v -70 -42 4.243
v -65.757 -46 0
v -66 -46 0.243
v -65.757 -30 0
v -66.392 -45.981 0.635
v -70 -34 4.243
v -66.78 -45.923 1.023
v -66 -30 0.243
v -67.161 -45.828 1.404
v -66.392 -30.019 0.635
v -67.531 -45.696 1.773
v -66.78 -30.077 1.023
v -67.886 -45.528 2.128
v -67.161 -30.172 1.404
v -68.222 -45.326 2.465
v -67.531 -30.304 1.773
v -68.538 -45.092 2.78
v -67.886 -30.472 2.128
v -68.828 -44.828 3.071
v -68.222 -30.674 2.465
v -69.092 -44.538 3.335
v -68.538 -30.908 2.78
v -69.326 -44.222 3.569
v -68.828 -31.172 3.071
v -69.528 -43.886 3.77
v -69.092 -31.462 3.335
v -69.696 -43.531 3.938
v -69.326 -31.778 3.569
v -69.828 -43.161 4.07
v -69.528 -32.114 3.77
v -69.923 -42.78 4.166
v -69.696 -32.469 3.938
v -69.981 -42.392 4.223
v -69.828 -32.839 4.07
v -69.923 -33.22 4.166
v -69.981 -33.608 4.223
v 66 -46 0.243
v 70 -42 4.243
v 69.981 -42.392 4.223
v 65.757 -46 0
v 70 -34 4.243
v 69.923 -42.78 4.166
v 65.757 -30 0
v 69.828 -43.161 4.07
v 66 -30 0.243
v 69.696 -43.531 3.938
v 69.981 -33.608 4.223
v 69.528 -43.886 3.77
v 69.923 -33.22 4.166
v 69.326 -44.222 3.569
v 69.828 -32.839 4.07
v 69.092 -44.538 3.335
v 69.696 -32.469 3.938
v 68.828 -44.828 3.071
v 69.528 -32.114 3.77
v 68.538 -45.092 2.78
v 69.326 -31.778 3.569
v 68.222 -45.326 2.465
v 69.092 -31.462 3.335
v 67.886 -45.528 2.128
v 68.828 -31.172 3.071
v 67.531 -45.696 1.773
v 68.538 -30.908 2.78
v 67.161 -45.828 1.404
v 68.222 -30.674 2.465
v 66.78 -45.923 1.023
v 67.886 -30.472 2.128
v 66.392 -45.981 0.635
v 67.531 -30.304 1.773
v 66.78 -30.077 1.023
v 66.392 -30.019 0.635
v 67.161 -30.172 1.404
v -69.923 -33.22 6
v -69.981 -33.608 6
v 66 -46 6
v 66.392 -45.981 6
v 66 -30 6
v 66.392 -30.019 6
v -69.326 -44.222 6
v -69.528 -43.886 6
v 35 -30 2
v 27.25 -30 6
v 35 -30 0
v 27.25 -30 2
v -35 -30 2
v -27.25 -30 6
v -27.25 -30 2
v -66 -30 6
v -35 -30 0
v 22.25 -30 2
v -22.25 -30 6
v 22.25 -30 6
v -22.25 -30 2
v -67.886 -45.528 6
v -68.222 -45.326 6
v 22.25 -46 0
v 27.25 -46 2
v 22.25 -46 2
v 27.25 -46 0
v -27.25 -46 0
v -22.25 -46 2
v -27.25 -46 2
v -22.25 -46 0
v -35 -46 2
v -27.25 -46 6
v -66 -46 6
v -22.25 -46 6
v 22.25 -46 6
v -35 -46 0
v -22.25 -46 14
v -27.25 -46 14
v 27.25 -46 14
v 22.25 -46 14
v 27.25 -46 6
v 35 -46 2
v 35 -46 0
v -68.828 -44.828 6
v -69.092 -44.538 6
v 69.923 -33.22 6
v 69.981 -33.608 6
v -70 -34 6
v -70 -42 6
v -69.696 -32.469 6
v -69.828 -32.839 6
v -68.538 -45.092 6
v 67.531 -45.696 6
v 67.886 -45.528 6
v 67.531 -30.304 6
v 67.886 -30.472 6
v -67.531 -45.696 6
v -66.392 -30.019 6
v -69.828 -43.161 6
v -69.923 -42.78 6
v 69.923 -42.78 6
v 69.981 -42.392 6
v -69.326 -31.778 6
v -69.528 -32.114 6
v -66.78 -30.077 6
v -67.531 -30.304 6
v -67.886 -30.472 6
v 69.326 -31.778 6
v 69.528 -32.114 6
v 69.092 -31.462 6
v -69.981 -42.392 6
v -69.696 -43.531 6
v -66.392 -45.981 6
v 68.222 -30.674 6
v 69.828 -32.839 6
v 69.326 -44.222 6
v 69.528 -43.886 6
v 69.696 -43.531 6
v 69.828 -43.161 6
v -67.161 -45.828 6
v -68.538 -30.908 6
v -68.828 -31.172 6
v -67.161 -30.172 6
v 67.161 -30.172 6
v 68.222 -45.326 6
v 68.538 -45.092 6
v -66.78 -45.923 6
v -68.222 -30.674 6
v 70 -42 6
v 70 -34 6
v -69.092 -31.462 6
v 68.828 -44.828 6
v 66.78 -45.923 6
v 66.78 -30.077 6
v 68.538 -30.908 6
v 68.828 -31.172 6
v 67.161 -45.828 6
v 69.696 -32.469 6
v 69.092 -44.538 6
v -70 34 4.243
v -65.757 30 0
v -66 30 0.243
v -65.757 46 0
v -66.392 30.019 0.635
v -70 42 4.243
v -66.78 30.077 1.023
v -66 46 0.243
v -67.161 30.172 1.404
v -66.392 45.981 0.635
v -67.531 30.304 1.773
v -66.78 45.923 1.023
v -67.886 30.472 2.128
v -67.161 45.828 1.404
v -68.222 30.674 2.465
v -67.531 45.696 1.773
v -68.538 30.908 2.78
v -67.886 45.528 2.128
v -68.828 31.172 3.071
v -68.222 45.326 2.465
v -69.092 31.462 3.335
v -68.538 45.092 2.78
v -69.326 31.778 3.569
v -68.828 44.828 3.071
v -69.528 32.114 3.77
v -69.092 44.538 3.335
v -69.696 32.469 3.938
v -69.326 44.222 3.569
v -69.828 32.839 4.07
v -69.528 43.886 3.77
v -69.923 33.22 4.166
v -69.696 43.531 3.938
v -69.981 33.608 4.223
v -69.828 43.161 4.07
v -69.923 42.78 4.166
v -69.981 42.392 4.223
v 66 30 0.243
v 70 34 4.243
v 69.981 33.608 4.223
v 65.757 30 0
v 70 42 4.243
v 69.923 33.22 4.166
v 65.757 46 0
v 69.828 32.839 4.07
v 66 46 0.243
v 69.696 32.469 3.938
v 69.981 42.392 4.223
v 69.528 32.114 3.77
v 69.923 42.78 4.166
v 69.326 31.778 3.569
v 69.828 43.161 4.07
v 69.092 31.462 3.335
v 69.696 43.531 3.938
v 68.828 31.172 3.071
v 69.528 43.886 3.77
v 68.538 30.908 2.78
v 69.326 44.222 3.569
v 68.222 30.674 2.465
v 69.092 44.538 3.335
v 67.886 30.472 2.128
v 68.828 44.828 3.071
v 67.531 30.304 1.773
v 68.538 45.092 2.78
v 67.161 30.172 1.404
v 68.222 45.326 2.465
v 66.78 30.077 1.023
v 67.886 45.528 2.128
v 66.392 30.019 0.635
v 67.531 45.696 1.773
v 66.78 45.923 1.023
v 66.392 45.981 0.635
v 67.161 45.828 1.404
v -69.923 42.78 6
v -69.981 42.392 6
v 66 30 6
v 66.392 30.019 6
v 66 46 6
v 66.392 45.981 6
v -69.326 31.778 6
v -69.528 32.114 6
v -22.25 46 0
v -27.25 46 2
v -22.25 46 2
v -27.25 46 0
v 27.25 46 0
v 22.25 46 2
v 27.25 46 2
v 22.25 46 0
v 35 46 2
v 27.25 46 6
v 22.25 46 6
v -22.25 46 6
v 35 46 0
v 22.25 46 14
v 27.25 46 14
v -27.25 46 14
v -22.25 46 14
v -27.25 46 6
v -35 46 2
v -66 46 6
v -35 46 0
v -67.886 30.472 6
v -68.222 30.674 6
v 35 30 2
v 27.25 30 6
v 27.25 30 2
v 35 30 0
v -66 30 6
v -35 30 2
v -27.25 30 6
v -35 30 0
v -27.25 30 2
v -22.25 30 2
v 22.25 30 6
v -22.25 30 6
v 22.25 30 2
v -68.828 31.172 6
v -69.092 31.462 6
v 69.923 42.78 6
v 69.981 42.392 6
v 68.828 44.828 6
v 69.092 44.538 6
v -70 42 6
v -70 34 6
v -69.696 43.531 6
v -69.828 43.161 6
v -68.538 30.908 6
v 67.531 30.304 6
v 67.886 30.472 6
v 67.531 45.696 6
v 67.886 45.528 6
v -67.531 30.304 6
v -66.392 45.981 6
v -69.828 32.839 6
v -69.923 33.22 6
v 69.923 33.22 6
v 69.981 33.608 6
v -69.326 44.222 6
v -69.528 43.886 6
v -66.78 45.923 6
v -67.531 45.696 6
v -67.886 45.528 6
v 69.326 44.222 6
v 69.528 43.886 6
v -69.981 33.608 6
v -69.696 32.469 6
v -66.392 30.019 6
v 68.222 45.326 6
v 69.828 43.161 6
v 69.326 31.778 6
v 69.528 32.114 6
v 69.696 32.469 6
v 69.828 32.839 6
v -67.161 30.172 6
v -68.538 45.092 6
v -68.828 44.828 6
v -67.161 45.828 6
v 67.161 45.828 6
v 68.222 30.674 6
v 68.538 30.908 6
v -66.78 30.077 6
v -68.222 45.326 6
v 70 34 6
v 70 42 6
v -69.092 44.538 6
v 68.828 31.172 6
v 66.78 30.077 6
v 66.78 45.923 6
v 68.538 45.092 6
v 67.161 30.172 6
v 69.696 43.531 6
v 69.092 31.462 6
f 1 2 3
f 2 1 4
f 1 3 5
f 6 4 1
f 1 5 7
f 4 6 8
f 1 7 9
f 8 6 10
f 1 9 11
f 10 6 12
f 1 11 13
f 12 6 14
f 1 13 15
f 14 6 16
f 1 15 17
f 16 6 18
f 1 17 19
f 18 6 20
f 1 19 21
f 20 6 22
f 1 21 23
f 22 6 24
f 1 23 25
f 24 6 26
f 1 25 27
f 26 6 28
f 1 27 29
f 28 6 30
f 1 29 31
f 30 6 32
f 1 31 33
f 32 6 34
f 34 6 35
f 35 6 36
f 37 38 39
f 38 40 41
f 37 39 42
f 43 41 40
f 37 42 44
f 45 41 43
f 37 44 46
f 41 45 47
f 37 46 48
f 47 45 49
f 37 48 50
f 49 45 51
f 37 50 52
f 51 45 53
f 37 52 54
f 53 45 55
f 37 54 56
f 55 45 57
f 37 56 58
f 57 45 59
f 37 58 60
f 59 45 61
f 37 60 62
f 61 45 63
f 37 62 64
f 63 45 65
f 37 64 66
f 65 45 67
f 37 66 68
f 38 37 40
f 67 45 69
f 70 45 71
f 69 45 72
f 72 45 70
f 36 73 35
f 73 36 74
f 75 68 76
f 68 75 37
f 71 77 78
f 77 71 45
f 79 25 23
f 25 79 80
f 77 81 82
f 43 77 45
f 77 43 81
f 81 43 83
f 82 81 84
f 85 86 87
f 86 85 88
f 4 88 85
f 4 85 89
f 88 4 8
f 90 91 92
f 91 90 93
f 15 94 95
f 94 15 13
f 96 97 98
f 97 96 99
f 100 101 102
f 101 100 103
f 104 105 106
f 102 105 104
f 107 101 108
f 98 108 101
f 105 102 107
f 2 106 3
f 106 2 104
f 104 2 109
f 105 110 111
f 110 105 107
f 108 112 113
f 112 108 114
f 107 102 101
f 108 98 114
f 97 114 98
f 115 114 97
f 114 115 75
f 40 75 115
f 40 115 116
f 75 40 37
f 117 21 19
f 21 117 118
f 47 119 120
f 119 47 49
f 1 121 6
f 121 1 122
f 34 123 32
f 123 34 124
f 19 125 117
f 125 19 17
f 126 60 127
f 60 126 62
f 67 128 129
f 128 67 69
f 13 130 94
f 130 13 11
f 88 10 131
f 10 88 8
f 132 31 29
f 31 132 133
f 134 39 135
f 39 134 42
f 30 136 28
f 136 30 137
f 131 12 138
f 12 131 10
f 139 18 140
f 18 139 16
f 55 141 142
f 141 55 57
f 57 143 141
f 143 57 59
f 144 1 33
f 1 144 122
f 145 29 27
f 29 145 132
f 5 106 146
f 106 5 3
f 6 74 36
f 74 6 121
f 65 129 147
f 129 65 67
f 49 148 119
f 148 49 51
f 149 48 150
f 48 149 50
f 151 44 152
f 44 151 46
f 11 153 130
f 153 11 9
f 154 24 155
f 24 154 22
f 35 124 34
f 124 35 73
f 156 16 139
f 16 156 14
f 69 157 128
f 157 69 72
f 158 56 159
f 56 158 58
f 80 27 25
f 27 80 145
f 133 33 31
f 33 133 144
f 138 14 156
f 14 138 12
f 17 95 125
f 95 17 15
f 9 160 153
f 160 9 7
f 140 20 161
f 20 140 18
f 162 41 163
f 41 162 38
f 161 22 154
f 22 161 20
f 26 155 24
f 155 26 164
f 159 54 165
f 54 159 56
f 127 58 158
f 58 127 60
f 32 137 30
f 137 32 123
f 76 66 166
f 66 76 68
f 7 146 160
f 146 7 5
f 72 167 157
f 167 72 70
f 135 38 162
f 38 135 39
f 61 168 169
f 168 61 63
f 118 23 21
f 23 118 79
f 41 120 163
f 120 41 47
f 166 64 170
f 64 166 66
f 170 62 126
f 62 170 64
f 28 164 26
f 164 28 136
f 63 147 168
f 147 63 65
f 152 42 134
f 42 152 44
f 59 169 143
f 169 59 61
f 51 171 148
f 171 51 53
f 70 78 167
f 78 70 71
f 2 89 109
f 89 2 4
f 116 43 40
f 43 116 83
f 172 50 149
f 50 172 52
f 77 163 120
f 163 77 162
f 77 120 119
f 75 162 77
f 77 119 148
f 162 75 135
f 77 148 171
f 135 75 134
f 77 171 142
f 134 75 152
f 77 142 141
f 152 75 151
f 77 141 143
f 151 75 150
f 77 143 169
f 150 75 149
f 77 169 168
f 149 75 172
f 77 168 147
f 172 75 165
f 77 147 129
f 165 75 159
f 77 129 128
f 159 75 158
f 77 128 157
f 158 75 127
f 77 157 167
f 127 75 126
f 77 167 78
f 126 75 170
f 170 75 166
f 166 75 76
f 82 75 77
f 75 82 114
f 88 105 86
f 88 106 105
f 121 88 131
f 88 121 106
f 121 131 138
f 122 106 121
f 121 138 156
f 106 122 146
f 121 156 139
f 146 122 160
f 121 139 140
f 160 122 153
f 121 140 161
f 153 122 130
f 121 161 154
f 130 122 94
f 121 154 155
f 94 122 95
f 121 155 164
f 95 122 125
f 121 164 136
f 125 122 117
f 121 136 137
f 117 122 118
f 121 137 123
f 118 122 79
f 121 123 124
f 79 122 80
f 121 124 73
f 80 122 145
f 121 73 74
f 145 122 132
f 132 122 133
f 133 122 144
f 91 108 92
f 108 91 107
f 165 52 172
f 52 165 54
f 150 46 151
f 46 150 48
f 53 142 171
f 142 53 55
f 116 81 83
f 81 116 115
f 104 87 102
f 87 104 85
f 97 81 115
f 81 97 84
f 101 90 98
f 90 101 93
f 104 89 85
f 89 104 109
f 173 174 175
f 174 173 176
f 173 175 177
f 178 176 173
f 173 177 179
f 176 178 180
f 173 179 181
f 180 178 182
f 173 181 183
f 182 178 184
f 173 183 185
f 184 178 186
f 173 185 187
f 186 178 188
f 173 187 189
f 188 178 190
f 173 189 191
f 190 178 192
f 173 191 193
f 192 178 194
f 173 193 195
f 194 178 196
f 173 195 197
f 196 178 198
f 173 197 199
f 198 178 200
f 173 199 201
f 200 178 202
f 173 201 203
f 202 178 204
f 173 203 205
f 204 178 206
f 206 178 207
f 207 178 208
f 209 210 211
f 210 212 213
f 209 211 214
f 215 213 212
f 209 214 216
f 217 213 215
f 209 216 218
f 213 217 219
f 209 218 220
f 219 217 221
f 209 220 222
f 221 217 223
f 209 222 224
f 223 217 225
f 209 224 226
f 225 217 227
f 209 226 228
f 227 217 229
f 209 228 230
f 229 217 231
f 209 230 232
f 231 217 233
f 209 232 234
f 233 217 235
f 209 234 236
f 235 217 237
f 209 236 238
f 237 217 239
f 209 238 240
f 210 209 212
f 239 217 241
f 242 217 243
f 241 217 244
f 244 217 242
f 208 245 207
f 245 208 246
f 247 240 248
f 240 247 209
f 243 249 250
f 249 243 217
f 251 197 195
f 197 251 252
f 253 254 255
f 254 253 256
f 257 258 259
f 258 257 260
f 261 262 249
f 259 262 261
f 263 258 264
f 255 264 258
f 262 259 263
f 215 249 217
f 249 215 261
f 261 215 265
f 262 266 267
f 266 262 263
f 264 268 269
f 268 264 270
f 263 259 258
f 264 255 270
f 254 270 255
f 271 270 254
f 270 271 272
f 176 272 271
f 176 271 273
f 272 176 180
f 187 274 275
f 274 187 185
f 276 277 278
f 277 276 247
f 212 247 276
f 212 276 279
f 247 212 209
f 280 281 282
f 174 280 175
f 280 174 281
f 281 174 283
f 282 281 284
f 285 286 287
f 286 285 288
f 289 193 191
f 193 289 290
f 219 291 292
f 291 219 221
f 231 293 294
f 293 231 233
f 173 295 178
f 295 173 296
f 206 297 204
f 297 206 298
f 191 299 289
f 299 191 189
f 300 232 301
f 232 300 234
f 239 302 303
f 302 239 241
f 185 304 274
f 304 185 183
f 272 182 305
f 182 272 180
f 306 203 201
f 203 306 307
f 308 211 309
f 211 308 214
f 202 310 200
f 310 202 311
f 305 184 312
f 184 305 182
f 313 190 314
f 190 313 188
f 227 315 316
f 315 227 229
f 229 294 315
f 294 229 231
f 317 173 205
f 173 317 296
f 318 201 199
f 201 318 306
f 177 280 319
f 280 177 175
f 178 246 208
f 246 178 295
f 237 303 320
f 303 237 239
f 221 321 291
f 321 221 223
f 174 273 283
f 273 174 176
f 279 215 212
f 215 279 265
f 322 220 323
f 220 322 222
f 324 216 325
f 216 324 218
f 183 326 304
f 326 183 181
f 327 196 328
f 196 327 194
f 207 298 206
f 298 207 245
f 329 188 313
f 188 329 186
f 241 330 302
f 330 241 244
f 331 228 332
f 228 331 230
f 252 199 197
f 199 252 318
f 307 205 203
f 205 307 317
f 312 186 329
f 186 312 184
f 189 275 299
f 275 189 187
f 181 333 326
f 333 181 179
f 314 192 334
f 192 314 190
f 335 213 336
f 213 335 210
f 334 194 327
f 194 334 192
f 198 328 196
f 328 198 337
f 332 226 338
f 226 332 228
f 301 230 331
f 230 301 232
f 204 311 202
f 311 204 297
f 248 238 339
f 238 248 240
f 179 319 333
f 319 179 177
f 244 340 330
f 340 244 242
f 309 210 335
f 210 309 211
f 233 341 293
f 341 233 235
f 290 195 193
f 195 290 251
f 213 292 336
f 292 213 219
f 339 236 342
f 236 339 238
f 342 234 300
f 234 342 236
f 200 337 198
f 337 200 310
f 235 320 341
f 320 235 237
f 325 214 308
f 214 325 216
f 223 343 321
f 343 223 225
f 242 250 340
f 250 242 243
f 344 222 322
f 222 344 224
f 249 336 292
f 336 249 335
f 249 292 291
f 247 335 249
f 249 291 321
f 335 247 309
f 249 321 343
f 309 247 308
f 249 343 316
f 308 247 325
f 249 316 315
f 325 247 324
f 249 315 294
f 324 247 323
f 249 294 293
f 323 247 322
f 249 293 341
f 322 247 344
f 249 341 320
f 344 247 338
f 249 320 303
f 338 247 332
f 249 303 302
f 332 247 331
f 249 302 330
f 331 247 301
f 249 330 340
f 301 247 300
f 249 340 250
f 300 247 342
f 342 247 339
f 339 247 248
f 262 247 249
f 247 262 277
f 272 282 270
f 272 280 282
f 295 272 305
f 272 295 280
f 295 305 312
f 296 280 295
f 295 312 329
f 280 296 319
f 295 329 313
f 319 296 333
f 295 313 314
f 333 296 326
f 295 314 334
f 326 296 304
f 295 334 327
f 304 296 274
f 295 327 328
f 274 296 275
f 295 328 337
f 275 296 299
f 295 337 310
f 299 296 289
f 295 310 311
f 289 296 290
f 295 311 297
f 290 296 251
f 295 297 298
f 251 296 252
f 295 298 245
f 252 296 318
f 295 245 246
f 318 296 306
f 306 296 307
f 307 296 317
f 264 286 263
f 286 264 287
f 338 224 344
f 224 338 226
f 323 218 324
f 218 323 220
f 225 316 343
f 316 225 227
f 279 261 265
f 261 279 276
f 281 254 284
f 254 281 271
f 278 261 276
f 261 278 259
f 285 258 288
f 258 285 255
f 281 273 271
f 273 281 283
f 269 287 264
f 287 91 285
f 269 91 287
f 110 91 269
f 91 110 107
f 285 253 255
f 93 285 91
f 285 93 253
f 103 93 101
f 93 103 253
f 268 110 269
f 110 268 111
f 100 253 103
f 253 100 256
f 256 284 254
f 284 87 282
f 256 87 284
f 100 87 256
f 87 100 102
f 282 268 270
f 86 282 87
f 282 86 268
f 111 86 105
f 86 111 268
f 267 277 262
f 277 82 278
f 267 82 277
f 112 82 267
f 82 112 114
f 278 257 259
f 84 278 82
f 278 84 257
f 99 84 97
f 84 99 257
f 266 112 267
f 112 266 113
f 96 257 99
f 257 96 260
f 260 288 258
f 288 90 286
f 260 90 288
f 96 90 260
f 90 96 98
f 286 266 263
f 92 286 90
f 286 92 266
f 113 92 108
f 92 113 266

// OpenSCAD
// file: ../lib/util.scad
// =============================================================================
// lib/util.scad — reusable 2D/3D helpers. All "cutter" modules are sized to
// over-shoot in Z so callers can subtract them cleanly; callers position them.
// Self-contained: `use <util.scad>` imports only modules, not variables, so we
// define our own over-cut constant here rather than relying on params.scad.
// =============================================================================

eps = 0.05;   // local over-cut for clean boolean subtractions

// ---- 2D primitives ----------------------------------------------------------

// Rounded rectangle centered at origin. r=0 -> sharp corners.
module rounded_rect(w, d, r = 0) {
    if (r > 0)
        offset(r = r) square([max(0.01, w - 2*r), max(0.01, d - 2*r)], center = true);
    else
        square([w, d], center = true);
}

// Isosceles trapezoid centered at origin: width w1 at the -X end, w2 at the +X
// end, length l along X. Used for the dovetail arm root + its mating pocket so
// the two always share one profile (call with +clearance for the pocket).
module trapezoid_2d(w1, w2, l) {
    polygon([[-l/2, -w1/2], [-l/2, w1/2], [l/2, w2/2], [l/2, -w2/2]]);
}

// Stadium slot: length l along X, width w along Y, fully rounded ends.
module slot_2d(l, w) {
    r = w / 2;
    hull() {
        translate([-(l/2 - r), 0]) circle(r = r);
        translate([ (l/2 - r), 0]) circle(r = r);
    }
}

// Inset-fillet a 2D shape: rounds BOTH convex and concave corners by radius r.
// Used for the arm root where the body blends into the clamp pad.
module fillet_2d(r) {
    offset(r = r) offset(delta = -r) children();
}

// ---- 3D solids --------------------------------------------------------------

// Flat plate: rounded rectangle, centered in XY, base on z=0.
module rounded_plate(w, d, h, r = 0) {
    linear_extrude(height = h) rounded_rect(w, d, r);
}

// ---- Cutters (subtract these) ----------------------------------------------

// Single through-hole, base on z=0, height h (caller lifts by -eps and pads h).
module hole(d, h) {
    translate([0, 0, -eps]) cylinder(d = d, h = h + 2*eps);
}

// 4-hole rectangular bolt pattern, spacing dx by dy, through a part of height h.
module bolt_grid(dx, dy, d, h) {
    for (x = [-dx/2, dx/2], y = [-dy/2, dy/2])
        translate([x, y, 0]) hole(d, h);
}

// 2-hole pair separated by `sep` along X (used for arm clamp / mast / cam).
module bolt_pair(sep, d, h) {
    for (x = [-sep/2, sep/2]) translate([x, 0, 0]) hole(d, h);
}

// Rounded-end through slot, length l along X.
module slot_cut(l, w, h) {
    translate([0, 0, -eps]) linear_extrude(height = h + 2*eps) slot_2d(l, w);
}

// Rectangular through cutout (window / strap slot), optional corner radius.
module rect_cut(l, w, h, r = 0) {
    translate([0, 0, -eps]) linear_extrude(height = h + 2*eps) rounded_rect(l, w, r);
}

// Shallow rectangular pocket cut DOWNWARD from the top face at z = top_z.
module pocket(l, w, depth, top_z, r = 0) {
    translate([0, 0, top_z - depth])
        linear_extrude(height = depth + eps) rounded_rect(l, w, r);
}

// Recess an arbitrary 2D child profile DOWN from the top face at z = top_z.
module recess_top(depth, top_z) {
    translate([0, 0, top_z - depth])
        linear_extrude(height = depth + eps) children();
}

// Recess an arbitrary 2D child profile UP from the bottom face (z = 0).
module recess_bottom(depth) {
    translate([0, 0, -eps])
        linear_extrude(height = depth + eps) children();
}

// Sensor-board seat: a rounded recess (captures the board by geometry, matching
// its rounded corners) plus two through mounting holes on the centerline.
// Subtract from a carrier of total thickness `h_total`, top face at `top_z`.
module board_cradle(l, w, r, depth, top_z, hole_d, hole_sep, h_total) {
    recess_top(depth, top_z) rounded_rect(l, w, r);
    for (x = [-hole_sep/2, hole_sep/2]) translate([x, 0, 0]) hole(hole_d, h_total);
}
// main file
// Part 6 — Battery Skid (landing gear around the under-slung pack)
// The pack rides in a ladder cradle: two transverse SKIS (the landing feet)
// joined by two longitudinal side rails whose walls guide the pack's sides.
// The frame's existing velcro straps (through the bottom-plate slots, spaced
// batt_strap_sep apart) wrap the pack AND this skid together — the ski centers
// sit exactly under the straps, and the central span of each ski's underside
// is relieved so the strap recesses and the skid stands on its four tip pads.
//
// Stance: skid_span (140) across roll x ~92 across pitch, versus the bare
// 43mm-wide battery it replaces as the ground contact. Prints flat, no
// supports (relief + chamfers face up when printed upside down — see below).
// PRINT: upside down (ski bottoms up) or as-is; both are support-free since
// the only overhangs are the 2mm relief and 45-degree tip chamfers.
include <../params.scad>
use <../lib/util.scad>

batt_chan = batt_w + 1.5;              // pack drop-in clearance across X
rail_x0   = batt_chan / 2;             // rail inner face
ski_hy    = skid_bar_w / 2;

module ski(y_c) {
    difference() {
        // bar with rounded tip corners
        translate([0, y_c, skid_slab_t / 2])
            linear_extrude(height = skid_slab_t, center = true)
                rounded_rect(skid_span, skid_bar_w, 4);
        // central underside relief: strap passage + guarantees 4-point stance
        translate([0, y_c, skid_relief_d / 2 - eps])
            cube([skid_relief_l, skid_bar_w + 2 * eps, skid_relief_d + 2 * eps],
                 center = true);
        // 45-degree chamfers on the tips' bottom edges (sled-style lead-in)
        for (sx = [-1, 1])
            translate([sx * skid_span / 2, y_c, 0])
                rotate([0, sx * 45, 0])
                    cube([2 * skid_tip_ch, skid_bar_w + 2 * eps, 2 * skid_tip_ch],
                         center = true);
    }
}

module rail(x_c) {
    // slab-level rail joining the skis, plus the pack-guide wall above it
    translate([x_c, 0, (skid_slab_t + skid_wall_h) / 2])
        cube([skid_rail_w, skid_ski_sep + skid_bar_w, skid_slab_t + skid_wall_h],
             center = true);
}

module battery_skid() {
    union() {
        for (sy = [-1, 1]) ski(sy * skid_ski_sep / 2);
        for (sx = [-1, 1]) rail(sx * (rail_x0 + skid_rail_w / 2));
    }
}

battery_skid();
